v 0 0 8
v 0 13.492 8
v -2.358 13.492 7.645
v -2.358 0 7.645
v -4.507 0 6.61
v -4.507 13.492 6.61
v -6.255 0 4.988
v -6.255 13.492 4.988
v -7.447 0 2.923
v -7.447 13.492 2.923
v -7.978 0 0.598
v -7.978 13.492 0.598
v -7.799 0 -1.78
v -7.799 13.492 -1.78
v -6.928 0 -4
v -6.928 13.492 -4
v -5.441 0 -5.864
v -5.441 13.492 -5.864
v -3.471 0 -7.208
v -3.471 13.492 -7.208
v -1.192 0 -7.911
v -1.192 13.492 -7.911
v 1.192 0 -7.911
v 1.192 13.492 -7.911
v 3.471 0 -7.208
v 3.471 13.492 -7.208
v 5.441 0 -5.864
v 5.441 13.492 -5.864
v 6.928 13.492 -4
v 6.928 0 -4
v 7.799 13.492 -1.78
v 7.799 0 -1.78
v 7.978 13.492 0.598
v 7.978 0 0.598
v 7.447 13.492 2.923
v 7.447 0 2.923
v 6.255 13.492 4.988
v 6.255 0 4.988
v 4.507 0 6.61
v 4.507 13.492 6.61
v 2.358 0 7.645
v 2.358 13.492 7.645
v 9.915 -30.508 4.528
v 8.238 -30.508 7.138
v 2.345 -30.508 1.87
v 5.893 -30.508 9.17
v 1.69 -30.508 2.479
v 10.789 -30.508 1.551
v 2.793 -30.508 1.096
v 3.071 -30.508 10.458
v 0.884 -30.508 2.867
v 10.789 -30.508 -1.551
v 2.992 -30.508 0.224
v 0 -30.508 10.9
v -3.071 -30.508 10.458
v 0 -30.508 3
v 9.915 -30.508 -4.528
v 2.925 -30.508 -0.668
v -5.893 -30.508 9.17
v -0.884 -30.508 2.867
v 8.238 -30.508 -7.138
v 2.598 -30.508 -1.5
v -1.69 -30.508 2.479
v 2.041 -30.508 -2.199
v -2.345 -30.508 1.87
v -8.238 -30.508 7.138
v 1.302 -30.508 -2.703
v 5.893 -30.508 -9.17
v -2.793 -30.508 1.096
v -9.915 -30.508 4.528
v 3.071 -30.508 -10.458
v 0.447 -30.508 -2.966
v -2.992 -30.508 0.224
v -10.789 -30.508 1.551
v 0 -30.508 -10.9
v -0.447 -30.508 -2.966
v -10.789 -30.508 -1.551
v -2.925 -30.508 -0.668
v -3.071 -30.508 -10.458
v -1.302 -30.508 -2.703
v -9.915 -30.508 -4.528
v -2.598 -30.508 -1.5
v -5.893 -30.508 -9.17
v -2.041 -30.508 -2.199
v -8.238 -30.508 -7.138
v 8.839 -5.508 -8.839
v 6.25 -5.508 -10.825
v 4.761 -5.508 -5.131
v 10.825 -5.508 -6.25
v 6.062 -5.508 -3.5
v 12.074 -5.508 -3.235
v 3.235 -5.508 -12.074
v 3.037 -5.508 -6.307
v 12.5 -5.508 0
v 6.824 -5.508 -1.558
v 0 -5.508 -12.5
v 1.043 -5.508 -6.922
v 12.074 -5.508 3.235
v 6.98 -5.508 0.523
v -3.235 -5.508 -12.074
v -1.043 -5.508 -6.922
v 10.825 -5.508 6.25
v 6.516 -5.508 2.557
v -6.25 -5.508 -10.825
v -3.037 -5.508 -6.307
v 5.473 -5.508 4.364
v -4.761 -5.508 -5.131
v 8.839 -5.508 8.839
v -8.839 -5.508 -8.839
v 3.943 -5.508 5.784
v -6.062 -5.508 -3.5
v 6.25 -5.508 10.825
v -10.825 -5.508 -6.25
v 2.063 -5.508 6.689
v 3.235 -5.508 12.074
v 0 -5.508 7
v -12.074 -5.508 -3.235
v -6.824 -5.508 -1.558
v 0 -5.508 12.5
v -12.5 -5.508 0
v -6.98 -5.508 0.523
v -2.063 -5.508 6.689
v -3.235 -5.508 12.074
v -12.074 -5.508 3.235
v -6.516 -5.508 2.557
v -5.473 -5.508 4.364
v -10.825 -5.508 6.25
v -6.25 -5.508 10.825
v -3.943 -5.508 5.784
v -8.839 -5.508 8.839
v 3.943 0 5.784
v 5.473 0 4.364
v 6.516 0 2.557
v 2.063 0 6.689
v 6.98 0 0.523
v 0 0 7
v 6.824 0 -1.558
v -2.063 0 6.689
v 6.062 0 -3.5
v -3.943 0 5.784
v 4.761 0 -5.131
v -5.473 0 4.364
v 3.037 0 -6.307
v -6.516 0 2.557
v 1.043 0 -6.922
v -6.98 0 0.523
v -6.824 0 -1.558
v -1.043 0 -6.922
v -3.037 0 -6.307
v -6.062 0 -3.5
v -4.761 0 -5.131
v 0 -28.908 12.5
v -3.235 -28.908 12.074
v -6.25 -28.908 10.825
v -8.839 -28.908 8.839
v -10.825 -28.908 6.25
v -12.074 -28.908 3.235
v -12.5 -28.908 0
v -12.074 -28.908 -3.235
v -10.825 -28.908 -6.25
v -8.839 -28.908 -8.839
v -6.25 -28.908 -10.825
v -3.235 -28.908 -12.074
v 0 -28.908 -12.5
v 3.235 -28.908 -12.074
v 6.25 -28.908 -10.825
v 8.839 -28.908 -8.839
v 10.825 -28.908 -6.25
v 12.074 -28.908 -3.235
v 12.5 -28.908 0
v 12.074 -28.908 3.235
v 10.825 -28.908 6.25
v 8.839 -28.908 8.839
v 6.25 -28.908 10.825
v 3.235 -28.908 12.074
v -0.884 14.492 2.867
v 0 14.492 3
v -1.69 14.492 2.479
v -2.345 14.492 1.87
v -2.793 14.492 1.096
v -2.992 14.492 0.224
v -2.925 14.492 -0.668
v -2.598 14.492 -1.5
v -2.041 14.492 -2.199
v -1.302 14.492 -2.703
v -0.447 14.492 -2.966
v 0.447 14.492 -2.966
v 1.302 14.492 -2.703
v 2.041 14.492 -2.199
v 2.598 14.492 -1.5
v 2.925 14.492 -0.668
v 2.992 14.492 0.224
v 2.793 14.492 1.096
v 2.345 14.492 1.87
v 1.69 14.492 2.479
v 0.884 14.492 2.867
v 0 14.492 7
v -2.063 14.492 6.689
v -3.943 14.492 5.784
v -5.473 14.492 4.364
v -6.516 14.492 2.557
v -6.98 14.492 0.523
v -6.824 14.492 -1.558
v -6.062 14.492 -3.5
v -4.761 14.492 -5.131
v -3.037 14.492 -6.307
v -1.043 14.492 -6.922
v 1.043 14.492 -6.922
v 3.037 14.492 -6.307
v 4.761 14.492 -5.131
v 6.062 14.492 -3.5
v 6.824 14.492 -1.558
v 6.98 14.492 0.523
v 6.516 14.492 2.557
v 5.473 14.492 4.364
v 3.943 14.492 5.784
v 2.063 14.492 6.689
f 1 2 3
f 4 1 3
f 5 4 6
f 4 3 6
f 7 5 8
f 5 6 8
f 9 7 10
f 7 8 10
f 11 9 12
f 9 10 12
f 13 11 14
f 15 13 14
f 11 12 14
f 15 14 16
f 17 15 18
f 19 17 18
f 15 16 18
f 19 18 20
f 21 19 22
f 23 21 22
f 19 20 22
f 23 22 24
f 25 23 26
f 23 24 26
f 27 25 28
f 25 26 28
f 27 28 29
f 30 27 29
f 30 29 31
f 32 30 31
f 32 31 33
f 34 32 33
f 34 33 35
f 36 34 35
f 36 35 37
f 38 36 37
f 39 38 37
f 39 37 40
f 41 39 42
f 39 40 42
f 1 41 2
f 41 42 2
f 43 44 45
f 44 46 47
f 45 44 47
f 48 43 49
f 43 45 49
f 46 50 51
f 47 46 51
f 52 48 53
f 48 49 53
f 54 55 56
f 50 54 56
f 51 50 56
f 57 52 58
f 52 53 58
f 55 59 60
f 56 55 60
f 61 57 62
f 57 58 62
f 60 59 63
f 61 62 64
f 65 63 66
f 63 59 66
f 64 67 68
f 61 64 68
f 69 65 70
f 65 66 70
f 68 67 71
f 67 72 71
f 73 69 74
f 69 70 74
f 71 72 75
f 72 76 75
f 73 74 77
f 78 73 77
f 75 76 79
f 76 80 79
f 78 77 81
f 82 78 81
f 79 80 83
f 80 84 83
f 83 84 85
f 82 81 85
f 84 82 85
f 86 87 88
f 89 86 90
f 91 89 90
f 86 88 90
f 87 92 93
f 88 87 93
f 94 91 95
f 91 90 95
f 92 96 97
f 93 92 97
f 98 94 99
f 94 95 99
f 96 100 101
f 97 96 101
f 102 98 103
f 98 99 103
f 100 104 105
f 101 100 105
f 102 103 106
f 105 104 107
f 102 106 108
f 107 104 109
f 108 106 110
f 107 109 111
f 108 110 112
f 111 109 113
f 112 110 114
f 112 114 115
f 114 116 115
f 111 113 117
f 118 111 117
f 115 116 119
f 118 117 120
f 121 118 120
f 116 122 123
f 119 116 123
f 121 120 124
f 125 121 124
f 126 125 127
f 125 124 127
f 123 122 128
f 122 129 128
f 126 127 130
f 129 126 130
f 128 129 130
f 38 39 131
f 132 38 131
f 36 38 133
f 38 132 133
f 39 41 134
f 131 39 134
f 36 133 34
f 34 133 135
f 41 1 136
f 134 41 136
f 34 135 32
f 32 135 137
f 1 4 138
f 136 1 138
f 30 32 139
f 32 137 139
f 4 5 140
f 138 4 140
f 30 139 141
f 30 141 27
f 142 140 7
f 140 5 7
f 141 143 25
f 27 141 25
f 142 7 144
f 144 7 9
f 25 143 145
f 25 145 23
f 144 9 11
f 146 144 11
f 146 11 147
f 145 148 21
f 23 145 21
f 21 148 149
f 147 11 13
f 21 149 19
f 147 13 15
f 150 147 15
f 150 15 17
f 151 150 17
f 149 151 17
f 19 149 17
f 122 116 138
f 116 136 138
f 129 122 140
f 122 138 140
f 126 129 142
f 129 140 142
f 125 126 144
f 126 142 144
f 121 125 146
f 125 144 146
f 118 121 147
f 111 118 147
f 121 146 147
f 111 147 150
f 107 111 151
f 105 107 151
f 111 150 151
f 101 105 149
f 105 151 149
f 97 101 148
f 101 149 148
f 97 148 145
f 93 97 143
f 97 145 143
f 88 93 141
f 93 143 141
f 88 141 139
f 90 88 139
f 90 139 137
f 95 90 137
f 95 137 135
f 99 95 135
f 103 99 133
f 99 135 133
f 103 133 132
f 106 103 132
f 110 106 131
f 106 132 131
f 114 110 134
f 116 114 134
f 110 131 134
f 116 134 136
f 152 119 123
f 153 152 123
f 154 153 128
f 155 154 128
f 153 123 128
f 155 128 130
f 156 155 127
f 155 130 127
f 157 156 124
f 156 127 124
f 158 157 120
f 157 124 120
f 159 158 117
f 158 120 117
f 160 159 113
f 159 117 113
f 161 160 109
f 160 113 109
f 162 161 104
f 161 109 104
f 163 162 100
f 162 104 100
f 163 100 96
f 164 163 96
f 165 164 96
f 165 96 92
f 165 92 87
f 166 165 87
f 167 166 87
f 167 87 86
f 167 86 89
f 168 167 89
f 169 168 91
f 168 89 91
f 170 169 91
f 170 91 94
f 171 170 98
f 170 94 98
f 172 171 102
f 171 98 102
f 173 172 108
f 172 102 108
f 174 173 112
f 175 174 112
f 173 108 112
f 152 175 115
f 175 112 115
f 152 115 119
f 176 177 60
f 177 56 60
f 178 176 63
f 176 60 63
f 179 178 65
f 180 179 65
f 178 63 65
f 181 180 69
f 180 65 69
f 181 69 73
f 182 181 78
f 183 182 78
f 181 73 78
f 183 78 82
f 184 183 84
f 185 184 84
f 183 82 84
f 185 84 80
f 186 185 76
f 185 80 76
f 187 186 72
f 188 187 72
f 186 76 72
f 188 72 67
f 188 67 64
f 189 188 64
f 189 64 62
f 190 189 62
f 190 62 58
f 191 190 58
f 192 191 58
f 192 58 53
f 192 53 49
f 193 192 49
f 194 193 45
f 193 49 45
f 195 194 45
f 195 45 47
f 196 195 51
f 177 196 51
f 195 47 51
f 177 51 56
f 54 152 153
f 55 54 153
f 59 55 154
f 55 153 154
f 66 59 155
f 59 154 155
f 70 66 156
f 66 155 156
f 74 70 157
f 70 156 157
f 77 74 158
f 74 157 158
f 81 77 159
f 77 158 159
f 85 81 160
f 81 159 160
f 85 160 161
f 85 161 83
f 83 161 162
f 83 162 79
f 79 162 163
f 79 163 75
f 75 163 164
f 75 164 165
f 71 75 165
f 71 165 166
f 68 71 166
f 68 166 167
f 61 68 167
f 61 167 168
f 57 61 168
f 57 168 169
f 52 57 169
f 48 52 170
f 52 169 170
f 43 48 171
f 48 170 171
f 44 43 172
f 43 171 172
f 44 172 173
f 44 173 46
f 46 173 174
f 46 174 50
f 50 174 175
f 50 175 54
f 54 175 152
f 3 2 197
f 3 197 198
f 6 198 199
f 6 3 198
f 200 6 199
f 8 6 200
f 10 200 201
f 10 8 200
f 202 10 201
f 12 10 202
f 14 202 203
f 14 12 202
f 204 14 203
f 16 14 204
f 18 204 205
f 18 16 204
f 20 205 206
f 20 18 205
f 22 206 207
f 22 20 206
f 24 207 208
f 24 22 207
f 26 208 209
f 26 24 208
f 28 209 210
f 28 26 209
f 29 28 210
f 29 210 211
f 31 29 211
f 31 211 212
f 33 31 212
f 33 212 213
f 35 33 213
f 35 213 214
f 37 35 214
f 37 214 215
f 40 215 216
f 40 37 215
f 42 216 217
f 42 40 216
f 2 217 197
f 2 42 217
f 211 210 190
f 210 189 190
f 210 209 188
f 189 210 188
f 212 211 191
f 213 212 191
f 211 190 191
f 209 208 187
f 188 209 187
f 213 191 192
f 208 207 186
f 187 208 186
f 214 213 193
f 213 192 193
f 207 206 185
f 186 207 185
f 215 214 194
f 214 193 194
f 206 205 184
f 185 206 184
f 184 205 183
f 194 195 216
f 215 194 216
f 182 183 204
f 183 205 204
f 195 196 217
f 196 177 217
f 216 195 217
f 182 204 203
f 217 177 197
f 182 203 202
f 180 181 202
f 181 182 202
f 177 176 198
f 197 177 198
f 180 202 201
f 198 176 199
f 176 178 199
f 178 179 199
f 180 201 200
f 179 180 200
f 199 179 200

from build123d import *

# Parameters (mm, degrees)
CHAMFER_1_SIZE = 1.6
CHAMFER_2_SIZE = 1


with BuildPart() as part:
    # Эскиз1 → Повернуть1 (revolve)
    with BuildSketch(Plane.XY, mode=Mode.PRIVATE) as revolve_1_sk:
        Polygon((3, -30.508474576), (12.5, -30.508474576), (12.5, -5.508474576), (7, -5.508474576), (7, 0), (8, 0), (8, 14.491525424), (3, 14.491525424), align=None)
    revolve(revolve_1_sk.sketch.rotate(Axis((0, 36.610169492, 0), (0, -1, 0)), 90), axis=Axis((0, 36.610169492, 0), (0, -1, 0)))

    # Фаска1
    chamfer_1_edges = [part.edges().sort_by_distance(p)[0] for p in [
        (0, -30.508474576, -12.5),
    ]]
    chamfer(chamfer_1_edges, length=CHAMFER_1_SIZE)

    # Фаска2
    chamfer_2_edges = [part.edges().sort_by_distance(p)[0] for p in [
        (0, 14.491525424, -8),
    ]]
    chamfer(chamfer_2_edges, length=CHAMFER_2_SIZE)


solid = part.part
